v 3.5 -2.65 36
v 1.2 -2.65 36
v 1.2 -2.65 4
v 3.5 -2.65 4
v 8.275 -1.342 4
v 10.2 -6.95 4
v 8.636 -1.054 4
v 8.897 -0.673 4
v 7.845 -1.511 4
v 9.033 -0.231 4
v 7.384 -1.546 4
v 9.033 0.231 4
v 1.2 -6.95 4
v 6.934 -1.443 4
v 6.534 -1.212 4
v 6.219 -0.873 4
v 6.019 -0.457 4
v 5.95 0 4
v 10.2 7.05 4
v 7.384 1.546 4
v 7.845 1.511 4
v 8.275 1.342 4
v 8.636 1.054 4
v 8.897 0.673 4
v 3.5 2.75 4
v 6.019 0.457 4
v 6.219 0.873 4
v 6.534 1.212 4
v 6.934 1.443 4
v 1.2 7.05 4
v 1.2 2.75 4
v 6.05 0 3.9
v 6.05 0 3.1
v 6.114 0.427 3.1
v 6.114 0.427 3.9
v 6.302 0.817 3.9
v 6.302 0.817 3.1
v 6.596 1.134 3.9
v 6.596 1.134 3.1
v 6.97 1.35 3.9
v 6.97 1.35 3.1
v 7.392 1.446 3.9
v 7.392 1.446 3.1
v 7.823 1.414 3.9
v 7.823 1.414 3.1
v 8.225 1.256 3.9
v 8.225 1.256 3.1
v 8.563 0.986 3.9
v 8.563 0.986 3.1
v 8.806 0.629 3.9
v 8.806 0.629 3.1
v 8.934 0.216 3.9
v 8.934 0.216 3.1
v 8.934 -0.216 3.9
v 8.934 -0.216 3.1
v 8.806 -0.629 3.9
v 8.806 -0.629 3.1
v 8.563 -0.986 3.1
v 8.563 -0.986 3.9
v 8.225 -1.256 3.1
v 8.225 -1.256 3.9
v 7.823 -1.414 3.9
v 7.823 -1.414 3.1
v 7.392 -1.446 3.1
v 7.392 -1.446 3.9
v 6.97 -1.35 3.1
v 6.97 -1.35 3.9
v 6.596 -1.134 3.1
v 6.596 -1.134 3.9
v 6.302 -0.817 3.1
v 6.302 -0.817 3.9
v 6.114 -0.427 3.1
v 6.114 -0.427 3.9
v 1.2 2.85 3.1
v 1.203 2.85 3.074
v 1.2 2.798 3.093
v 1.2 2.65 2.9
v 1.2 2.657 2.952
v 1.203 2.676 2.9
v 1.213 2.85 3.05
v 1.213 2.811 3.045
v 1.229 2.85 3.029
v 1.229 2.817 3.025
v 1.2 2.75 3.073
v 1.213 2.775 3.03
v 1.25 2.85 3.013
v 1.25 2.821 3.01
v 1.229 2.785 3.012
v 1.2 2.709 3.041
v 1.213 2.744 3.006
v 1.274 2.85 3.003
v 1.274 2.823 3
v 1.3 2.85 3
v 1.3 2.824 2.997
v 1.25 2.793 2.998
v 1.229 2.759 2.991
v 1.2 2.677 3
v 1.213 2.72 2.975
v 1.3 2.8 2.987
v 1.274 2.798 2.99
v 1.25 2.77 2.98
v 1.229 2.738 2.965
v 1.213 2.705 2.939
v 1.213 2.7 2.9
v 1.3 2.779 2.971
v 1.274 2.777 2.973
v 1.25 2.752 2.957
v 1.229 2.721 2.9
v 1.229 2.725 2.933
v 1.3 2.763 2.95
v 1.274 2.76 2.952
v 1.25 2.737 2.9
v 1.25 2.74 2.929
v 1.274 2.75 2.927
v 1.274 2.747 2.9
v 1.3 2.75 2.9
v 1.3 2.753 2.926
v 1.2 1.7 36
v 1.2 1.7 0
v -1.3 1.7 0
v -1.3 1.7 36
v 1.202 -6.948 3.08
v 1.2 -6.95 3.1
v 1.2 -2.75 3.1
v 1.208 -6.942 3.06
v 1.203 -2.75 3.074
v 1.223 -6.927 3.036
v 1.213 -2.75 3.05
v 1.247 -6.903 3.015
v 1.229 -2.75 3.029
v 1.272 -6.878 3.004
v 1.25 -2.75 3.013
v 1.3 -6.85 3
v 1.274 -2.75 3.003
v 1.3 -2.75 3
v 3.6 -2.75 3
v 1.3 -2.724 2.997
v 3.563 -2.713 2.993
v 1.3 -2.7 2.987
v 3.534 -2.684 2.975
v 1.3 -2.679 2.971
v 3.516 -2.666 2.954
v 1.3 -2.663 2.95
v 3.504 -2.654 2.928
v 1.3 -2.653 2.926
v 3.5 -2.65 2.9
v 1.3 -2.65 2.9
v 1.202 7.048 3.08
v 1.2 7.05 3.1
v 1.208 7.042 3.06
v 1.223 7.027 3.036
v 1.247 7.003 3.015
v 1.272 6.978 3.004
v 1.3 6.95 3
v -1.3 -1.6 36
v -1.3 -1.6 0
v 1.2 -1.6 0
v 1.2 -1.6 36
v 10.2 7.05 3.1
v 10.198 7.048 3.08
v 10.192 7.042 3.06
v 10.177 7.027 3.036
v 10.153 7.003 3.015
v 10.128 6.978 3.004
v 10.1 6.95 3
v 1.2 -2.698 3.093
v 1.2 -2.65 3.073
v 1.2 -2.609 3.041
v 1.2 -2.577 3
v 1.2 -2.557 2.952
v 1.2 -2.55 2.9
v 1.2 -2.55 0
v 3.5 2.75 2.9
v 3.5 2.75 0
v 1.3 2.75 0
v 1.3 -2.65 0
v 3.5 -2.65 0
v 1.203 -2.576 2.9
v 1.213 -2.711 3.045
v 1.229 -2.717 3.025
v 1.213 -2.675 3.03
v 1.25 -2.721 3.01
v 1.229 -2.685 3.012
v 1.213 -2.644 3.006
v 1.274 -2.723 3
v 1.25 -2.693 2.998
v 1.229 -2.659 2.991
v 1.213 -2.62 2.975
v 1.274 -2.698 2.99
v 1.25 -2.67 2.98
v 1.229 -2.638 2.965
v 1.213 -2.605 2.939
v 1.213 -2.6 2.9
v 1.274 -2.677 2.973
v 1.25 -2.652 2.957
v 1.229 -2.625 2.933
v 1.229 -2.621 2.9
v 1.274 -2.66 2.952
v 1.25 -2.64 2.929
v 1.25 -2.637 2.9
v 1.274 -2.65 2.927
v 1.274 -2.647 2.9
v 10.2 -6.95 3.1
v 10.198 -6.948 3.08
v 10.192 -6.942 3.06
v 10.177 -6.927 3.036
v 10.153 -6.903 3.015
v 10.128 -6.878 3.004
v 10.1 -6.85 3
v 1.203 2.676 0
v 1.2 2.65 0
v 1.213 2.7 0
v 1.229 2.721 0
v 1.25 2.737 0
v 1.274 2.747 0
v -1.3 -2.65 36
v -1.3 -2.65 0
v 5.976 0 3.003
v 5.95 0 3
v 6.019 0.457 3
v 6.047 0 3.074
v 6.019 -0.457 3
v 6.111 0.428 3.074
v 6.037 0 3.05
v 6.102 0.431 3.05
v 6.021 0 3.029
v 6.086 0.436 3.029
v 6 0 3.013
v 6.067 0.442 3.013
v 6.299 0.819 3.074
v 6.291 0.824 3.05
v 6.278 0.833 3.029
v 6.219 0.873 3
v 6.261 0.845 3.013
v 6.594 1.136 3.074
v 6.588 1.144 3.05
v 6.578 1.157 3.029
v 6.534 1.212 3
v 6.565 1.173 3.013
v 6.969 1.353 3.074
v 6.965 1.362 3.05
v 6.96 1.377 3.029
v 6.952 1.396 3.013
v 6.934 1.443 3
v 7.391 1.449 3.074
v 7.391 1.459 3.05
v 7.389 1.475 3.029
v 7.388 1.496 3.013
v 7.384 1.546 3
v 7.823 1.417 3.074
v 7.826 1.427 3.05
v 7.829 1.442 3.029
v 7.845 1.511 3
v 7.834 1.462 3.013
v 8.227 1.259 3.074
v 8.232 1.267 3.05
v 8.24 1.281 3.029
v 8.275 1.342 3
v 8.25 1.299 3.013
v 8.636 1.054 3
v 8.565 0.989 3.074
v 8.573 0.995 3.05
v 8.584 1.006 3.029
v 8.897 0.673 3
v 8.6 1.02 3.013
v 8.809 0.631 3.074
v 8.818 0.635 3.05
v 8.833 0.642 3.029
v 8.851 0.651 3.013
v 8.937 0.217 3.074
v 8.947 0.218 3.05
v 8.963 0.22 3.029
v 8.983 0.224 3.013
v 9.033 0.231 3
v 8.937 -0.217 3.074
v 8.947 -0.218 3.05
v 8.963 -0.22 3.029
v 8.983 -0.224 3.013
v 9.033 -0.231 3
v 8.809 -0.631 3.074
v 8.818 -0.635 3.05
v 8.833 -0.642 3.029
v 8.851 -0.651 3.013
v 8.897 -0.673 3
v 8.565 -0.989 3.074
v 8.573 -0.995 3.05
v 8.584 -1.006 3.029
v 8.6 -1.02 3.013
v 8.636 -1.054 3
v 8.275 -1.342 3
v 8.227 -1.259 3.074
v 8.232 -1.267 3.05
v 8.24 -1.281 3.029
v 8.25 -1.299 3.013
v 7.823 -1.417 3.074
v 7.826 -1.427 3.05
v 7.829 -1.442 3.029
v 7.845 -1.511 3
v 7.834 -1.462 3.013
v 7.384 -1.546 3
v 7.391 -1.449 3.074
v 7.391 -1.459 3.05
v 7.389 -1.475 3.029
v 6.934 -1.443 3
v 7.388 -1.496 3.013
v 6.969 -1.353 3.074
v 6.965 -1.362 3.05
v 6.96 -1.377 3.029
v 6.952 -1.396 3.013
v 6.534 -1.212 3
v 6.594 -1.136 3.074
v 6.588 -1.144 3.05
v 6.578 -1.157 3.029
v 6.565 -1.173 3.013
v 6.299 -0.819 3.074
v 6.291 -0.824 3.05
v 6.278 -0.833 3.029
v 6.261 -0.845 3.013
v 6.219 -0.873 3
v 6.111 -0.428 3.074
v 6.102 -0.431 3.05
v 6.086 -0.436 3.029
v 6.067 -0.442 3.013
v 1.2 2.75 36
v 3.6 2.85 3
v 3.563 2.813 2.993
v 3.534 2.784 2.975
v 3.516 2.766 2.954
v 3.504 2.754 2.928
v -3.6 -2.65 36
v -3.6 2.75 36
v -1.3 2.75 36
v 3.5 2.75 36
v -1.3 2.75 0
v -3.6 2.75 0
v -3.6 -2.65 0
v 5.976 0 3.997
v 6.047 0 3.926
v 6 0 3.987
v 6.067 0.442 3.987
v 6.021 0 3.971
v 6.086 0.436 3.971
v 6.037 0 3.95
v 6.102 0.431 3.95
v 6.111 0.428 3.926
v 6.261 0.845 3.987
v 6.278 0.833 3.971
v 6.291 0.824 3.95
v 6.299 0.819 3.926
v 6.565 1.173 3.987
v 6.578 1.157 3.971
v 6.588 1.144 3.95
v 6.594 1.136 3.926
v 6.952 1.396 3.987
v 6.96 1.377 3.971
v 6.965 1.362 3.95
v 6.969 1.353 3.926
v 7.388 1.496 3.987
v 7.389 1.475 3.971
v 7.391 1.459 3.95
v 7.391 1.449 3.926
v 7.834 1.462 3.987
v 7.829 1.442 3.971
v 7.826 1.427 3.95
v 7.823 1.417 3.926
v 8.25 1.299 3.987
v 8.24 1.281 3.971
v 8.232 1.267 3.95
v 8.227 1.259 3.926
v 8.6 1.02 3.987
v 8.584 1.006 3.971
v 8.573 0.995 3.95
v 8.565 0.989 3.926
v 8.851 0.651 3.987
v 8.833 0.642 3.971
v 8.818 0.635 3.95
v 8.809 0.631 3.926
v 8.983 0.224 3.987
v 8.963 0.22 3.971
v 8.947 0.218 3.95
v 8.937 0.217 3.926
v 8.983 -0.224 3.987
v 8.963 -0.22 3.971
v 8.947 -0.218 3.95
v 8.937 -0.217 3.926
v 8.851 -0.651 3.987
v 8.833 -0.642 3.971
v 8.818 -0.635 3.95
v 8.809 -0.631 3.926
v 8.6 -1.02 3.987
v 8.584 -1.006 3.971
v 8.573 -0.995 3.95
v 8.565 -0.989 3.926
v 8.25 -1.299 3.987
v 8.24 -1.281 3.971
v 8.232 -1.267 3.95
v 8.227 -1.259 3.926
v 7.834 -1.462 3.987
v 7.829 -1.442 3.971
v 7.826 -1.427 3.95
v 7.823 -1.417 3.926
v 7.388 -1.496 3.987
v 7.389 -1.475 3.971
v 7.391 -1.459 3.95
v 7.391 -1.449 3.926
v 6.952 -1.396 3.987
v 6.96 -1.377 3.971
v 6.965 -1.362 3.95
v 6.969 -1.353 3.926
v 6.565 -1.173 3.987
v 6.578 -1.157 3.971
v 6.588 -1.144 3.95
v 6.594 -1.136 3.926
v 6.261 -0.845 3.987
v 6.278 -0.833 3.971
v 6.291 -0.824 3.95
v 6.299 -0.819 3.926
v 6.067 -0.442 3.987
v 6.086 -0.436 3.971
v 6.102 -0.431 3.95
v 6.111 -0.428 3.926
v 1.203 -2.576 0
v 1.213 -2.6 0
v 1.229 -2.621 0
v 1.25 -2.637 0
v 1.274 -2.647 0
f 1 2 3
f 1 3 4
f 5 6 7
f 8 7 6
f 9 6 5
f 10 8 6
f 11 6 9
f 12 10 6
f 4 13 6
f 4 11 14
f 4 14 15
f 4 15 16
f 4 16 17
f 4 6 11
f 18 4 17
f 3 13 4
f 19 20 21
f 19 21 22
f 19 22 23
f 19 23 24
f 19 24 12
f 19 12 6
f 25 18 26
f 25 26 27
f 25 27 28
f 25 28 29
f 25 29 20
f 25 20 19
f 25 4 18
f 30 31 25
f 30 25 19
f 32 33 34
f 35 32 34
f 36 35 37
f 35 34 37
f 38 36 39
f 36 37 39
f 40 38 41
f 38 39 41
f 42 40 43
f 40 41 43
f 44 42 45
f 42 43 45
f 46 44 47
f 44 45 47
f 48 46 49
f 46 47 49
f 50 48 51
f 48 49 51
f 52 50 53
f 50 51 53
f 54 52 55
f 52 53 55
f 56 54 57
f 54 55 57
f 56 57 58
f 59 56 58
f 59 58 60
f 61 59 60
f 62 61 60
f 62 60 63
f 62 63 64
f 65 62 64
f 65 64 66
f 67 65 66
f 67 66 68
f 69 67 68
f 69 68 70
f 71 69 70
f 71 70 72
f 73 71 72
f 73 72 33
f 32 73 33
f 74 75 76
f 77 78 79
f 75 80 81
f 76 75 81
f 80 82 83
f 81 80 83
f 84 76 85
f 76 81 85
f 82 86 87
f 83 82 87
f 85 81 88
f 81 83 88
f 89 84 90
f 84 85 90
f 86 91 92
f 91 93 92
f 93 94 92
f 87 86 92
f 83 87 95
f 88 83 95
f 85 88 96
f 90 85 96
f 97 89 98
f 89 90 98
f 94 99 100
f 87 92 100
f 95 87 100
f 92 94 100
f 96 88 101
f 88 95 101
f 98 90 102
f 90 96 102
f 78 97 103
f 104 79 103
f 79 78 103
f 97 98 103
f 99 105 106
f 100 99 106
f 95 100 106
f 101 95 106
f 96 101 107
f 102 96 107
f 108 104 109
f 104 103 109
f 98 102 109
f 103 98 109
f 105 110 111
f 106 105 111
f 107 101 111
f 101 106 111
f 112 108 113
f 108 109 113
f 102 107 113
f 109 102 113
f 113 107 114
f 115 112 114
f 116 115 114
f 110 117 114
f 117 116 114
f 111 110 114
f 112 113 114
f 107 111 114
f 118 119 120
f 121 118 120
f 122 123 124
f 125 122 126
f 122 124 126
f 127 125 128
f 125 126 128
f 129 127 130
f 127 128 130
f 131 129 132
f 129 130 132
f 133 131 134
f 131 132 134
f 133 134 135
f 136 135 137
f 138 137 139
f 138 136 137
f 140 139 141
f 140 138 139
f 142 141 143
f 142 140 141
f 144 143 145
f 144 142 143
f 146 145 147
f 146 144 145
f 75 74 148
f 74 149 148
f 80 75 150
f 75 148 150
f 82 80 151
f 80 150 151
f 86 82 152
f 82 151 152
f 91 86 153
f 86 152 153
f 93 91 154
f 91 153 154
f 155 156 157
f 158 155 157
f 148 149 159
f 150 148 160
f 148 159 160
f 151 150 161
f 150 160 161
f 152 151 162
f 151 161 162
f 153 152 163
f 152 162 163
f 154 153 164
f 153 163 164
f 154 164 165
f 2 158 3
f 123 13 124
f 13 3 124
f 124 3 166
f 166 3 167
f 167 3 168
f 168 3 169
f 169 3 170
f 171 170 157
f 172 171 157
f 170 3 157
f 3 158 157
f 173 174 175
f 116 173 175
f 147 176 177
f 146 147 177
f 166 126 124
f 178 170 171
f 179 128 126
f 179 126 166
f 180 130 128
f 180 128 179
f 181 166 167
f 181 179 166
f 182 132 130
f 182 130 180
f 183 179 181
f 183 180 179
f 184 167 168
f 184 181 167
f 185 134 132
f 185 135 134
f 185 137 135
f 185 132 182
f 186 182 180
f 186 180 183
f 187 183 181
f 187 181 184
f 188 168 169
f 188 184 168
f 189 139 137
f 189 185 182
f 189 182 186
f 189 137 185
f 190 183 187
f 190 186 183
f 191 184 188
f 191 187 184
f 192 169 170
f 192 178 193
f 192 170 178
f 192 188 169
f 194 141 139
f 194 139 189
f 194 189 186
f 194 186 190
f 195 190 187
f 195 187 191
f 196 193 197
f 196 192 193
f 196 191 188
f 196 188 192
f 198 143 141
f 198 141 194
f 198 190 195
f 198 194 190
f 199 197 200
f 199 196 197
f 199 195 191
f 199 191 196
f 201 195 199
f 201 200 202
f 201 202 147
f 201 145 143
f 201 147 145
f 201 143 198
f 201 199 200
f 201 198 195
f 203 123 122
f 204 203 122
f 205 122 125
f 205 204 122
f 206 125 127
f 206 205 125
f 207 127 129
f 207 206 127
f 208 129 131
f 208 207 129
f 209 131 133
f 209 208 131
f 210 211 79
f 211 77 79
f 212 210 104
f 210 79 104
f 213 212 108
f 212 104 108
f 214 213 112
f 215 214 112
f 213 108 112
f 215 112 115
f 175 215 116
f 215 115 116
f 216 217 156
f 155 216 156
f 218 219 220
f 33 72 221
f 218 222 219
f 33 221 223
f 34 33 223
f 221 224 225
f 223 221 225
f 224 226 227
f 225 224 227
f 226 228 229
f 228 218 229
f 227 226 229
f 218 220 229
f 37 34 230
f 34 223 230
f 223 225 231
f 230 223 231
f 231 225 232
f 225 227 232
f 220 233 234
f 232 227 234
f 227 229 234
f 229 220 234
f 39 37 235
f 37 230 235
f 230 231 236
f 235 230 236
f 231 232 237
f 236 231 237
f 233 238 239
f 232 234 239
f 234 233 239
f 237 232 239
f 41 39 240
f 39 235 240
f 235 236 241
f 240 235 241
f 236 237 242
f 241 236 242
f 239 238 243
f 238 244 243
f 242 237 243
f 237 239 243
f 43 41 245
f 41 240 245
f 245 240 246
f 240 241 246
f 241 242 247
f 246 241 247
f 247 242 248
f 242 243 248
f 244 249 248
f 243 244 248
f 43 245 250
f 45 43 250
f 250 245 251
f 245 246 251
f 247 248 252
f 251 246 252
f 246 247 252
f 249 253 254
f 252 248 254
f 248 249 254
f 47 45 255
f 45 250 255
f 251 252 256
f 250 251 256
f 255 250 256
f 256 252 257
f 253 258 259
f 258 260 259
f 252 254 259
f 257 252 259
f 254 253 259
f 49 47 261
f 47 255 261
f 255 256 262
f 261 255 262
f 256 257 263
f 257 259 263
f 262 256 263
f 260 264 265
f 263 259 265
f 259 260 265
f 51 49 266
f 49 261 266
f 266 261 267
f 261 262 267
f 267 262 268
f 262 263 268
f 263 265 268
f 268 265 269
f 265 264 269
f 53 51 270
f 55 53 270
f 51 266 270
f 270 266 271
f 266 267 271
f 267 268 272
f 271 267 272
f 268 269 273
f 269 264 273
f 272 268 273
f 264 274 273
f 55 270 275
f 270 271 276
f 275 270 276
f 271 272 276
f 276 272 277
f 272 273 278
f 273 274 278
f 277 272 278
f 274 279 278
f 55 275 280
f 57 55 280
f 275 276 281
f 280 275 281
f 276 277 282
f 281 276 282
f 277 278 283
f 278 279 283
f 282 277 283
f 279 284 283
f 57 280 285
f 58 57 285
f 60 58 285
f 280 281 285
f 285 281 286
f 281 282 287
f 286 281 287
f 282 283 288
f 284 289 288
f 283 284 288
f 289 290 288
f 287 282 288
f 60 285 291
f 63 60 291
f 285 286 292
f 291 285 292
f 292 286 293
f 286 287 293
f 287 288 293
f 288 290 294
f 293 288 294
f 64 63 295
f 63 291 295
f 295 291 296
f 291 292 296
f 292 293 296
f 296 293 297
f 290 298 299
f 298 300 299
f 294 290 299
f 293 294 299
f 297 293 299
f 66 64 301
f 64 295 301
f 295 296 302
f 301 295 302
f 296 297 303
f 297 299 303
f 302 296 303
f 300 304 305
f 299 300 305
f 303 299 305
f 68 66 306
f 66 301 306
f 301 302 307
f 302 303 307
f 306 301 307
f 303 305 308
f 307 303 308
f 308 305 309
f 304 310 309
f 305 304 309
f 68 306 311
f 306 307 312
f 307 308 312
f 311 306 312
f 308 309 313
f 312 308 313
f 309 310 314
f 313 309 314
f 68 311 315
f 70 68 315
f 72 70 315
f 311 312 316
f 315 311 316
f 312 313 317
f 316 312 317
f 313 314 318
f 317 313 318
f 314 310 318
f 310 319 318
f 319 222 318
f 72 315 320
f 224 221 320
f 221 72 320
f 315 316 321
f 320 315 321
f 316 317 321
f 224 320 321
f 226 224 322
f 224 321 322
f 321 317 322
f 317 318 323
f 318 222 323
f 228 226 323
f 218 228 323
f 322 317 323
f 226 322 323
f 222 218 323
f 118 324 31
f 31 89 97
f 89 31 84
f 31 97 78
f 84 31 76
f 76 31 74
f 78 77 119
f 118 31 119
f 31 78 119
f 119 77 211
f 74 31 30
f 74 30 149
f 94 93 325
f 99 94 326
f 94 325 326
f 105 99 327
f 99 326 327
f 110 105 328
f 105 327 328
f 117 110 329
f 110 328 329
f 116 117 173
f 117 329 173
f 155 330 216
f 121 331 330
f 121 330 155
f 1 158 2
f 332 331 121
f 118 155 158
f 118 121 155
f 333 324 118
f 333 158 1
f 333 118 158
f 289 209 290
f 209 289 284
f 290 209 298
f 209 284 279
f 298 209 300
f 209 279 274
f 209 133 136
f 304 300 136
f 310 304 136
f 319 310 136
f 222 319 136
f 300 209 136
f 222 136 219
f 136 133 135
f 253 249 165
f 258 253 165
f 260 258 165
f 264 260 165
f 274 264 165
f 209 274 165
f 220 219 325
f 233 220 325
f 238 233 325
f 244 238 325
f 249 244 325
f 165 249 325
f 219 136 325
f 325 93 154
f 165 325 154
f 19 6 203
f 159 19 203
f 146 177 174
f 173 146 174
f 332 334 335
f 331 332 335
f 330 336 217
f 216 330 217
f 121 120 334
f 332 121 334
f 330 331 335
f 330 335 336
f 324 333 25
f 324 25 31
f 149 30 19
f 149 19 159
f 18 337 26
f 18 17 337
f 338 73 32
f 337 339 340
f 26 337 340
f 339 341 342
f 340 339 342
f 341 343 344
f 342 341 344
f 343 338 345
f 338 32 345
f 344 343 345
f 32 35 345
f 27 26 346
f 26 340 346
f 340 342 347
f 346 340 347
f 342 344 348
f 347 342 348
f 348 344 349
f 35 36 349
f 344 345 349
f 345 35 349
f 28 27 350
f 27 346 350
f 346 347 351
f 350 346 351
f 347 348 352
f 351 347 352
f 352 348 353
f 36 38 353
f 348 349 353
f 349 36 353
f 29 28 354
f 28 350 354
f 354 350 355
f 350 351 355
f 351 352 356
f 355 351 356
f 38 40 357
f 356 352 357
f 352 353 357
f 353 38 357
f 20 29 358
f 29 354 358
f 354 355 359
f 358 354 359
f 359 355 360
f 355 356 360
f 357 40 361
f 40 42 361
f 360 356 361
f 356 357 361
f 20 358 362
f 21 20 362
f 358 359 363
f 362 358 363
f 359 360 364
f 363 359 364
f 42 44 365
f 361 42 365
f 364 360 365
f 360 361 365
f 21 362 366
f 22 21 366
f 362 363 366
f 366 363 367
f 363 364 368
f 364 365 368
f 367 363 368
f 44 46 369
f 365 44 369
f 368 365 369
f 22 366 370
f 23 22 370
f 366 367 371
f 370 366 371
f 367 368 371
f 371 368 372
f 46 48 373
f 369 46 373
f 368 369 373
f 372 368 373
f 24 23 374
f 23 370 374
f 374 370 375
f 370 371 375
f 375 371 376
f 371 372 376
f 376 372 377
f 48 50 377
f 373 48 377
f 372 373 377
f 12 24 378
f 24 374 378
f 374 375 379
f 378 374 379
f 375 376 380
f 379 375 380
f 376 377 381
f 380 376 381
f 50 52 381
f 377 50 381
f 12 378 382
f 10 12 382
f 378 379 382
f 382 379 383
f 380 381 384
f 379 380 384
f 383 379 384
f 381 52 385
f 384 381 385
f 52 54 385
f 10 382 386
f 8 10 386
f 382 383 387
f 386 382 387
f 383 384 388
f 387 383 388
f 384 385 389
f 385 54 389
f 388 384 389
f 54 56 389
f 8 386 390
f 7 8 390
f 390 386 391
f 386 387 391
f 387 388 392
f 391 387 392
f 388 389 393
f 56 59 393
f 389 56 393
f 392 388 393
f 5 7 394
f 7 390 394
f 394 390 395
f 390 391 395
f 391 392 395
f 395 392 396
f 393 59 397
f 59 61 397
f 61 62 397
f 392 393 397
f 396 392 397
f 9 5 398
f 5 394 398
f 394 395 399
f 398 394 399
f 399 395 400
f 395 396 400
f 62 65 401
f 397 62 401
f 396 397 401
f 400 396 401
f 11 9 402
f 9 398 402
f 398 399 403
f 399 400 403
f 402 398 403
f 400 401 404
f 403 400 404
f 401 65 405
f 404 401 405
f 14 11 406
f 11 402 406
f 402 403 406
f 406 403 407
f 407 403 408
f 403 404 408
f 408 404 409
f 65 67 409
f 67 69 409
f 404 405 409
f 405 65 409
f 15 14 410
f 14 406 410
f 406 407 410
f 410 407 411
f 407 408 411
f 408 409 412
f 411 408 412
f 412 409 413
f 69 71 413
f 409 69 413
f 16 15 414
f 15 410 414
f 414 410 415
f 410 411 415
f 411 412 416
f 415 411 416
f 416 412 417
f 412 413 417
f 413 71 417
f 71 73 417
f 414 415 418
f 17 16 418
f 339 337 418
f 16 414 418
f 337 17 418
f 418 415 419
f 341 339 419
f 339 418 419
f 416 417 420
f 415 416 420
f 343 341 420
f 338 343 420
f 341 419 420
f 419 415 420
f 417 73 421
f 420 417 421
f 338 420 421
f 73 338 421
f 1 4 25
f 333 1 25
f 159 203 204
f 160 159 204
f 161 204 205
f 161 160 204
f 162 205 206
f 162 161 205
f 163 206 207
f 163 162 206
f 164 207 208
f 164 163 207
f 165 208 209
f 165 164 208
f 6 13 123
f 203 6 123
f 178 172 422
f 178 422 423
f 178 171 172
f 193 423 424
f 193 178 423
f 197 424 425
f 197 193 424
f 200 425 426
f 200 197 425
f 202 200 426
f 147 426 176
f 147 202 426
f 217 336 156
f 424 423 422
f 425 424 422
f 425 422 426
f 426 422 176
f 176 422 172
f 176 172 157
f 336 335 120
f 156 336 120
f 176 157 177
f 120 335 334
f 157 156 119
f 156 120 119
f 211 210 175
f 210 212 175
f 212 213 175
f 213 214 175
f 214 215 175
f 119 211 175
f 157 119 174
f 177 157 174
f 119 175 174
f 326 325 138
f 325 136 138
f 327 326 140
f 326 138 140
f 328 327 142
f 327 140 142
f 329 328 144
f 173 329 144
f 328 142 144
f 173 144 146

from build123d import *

# Parameters (mm, degrees)
BOSS_EXTRUDE1_DEPTH = 60
SKETCH2_W           = 2.3
SKETCH2_H           = 1
CUT_EXTRUDE1_DEPTH  = 10
SKETCH3_W           = 1
SKETCH3_H           = 14
BOSS_EXTRUDE2_DEPTH = 9
SKETCH4_R           = 1.45
CUT_EXTRUDE2_DEPTH  = 9
FILLET1_R           = 0.1
SKETCH5_W           = 7.1
SKETCH5_H           = 5.4
CUT_EXTRUDE3_DEPTH  = 24


with BuildPart() as part:
    # Sketch1 → Boss-Extrude1 (new body)
    with BuildSketch(Plane.XY):
        Polygon((-1.3, 2.75), (-3.6, 2.75), (-3.6, -2.65), (-1.3, -2.65), (-1.3, -1.6), (1.2, -1.6), (1.2, -2.65), (3.5, -2.65), (3.5, 2.75), (1.2, 2.75), (1.2, 1.7), (-1.3, 1.7), align=None)
    extrude(amount=BOSS_EXTRUDE1_DEPTH)

    # Sketch2 → Cut-Extrude1 (cut)
    with BuildSketch(Plane(origin=(0, 2.75, 0), x_dir=(1, 0, 0), z_dir=(0, 1, 0))):
        with Locations((2.35, -3.5)):
            Rectangle(SKETCH2_W, SKETCH2_H)
    extrude(amount=-CUT_EXTRUDE1_DEPTH, mode=Mode.SUBTRACT)

    # Sketch3 → Boss-Extrude2 (add)
    with BuildSketch(Plane(origin=(1.2, 0, 0), x_dir=(0, 0, -1), z_dir=(1, 0, 0))):
        with Locations((-3.5, 0.05)):
            Rectangle(SKETCH3_W, SKETCH3_H)
    extrude(amount=BOSS_EXTRUDE2_DEPTH)

    # Sketch4 → Cut-Extrude2 (cut)
    with BuildSketch(Plane(origin=(0, 0, 3), x_dir=(-1, 0, 0), z_dir=(0, 0, -1))):
        with Locations((-7.5, 0)):
            Circle(SKETCH4_R)
    extrude(amount=-CUT_EXTRUDE2_DEPTH, mode=Mode.SUBTRACT)

    # Fillet1
    fillet1_edges = [part.edges().sort_by_distance(p)[0] for p in [
        (1.2, 2.75, 1.5),
        (1.2, -2.65, 1.5),
        (3.5, 0.05, 3),
        (2.35, -2.65, 3),
        (2.35, 2.75, 3),
        (1.2, -4.8, 3),
        (1.2, 4.9, 3),
        (5.7, -6.95, 3),
        (5.7, 7.05, 3),
        (10.2, 0.05, 3),
        (8.95, 0, 4),
        (8.95, 0, 3),
    ]]
    fillet(fillet1_edges, radius=FILLET1_R)

    # Sketch5 → Cut-Extrude3 (cut)
    with BuildSketch(Plane.XY.offset(60)):
        with Locations((-0.05, 0.05)):
            Rectangle(SKETCH5_W, SKETCH5_H)
    extrude(amount=-CUT_EXTRUDE3_DEPTH, mode=Mode.SUBTRACT)


solid = part.part
